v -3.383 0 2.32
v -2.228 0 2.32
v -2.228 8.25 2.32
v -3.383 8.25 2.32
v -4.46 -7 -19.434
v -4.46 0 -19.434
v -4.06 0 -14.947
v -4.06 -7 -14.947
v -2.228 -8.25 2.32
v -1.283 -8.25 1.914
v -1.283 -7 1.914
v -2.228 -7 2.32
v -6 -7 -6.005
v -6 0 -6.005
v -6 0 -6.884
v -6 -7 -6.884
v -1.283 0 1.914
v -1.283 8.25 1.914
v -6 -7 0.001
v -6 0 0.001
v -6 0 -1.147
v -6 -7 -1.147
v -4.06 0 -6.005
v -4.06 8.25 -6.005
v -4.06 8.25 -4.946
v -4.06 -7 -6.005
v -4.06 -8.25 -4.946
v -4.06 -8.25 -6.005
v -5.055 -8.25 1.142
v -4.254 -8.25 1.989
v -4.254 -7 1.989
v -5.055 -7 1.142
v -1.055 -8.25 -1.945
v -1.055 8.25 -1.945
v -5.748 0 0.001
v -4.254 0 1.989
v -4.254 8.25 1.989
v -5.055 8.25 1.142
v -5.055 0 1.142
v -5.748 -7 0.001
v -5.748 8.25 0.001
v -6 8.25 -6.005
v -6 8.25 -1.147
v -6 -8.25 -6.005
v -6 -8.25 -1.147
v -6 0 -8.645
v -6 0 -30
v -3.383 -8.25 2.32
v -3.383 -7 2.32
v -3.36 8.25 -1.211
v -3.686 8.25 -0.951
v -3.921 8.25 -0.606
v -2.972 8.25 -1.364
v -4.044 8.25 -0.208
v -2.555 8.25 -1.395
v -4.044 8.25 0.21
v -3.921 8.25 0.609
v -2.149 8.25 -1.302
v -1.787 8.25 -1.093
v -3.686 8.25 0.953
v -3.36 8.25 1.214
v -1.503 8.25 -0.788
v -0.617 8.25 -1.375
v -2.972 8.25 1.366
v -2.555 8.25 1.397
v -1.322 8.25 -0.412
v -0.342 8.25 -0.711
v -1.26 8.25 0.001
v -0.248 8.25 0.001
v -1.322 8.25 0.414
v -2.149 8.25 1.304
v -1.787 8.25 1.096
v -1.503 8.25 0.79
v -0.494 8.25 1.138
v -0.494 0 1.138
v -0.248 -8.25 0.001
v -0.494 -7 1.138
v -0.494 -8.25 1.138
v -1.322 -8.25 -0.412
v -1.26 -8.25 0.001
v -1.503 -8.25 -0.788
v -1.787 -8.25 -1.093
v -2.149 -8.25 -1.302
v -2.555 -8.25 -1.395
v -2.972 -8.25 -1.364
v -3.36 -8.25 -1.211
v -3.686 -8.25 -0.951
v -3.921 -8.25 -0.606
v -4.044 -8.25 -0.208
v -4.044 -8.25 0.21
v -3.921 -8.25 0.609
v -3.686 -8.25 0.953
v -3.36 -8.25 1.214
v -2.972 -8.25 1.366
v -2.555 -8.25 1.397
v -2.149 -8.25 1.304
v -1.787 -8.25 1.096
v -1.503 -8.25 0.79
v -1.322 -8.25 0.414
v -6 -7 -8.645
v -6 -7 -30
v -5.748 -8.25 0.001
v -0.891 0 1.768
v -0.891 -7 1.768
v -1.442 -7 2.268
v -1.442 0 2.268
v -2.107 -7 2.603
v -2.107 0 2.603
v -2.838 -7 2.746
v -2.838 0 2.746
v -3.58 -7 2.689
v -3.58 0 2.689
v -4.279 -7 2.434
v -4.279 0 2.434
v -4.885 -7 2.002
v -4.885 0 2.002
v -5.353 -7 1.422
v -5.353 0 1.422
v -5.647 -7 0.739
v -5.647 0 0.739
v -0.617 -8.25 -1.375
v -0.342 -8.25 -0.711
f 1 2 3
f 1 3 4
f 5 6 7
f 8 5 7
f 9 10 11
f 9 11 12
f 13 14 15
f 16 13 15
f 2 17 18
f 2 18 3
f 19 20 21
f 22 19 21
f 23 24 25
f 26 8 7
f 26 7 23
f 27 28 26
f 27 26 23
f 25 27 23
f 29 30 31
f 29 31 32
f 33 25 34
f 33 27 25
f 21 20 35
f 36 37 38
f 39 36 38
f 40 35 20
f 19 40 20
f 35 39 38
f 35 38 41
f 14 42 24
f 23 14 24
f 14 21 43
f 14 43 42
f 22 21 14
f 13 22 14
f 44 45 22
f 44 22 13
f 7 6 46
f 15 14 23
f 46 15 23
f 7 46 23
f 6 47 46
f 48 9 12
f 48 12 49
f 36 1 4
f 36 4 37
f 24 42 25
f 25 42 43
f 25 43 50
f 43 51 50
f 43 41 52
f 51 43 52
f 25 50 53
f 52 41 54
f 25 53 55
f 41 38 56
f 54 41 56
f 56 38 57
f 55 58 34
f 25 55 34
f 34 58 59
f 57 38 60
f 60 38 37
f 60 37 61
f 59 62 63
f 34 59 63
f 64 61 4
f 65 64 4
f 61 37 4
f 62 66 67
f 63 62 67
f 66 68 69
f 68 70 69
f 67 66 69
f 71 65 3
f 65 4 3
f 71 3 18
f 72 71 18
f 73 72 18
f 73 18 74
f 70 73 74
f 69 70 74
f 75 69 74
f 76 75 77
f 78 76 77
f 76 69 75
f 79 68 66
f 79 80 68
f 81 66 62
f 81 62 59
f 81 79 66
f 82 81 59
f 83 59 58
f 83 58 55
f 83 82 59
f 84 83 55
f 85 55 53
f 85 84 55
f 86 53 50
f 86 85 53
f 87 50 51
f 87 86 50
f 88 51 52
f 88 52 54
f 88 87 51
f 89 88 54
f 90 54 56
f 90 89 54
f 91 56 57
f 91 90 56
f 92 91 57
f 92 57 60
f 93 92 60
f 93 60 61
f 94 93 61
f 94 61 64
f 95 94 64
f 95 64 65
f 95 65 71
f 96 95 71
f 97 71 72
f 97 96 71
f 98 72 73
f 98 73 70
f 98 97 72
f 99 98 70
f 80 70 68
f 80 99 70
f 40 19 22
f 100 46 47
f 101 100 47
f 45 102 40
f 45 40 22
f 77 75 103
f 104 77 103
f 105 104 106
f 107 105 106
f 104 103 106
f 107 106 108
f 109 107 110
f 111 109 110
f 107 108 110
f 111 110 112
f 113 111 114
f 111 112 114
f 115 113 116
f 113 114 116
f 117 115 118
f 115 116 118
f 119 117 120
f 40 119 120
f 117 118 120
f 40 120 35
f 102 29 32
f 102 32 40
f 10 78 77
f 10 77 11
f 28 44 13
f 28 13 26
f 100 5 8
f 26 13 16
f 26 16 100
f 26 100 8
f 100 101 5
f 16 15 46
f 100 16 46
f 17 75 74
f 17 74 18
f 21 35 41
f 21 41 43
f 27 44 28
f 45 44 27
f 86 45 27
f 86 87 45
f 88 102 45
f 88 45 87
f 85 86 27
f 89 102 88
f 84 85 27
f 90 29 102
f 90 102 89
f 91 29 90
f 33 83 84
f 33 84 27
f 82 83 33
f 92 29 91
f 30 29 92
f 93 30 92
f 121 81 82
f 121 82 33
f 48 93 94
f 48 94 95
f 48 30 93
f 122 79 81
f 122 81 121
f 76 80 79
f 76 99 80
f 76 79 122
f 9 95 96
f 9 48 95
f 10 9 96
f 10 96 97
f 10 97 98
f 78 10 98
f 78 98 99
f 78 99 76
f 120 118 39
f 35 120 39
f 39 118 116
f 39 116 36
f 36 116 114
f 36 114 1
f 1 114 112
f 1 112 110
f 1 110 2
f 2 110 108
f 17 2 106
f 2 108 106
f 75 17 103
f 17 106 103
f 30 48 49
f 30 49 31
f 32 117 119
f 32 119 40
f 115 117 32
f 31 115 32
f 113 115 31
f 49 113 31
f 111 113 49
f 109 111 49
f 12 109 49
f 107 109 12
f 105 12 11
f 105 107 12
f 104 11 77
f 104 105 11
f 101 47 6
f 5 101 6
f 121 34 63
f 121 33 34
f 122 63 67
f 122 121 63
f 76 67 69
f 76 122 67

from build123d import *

# Parameters (mm, degrees)
F1_DEPTH = 8.25
F2_DEPTH = 7


# Not quite as in the source:
# - a feature names something its author has since deleted; it is built from what else it names


with BuildPart() as f1:
    # F0 (on Front) → F1 (new body, symmetric)
    with BuildSketch(Plane.XZ):
        with BuildLine():
            Line((-1.2599999983, 0.001106019), (-0.2481810163, 0.001106019))
            Line((-0.2481810241, 0.001106019), (-0.4941885147, 1.1379972147))
            Line((-0.4941885147, 1.1379972147), (-1.2832667135, 1.9140606746))
            Line((-1.2832667135, 1.9140606746), (-2.2277169394, 2.3196199825))
            Line((-2.2277169394, 2.3196199825), (-3.3833966788, 2.3196199825))
            Line((-3.3833966788, 2.3196199825), (-4.2535923825, 1.9888198258))
            Line((-4.2535923825, 1.9888198258), (-5.0546050044, 1.1417629963))
            Line((-5.0546050044, 1.1417629963), (-5.7481810085, 0.001106019))
            Line((-5.7481810085, 0.001106019), (-4.0599999983, 0.001106019))
            ThreePointArc((-4.0599999983, 0.001106019), (-2.6599999983, 1.401106019), (-1.2599999983, 0.001106019))
        make_face()
        with BuildLine():
            ThreePointArc((-1.0547499373, -1.9445495701), (-0.4578133732, -1.0519999951), (-0.2481810085, 0.001106019))
            Line((-0.2481810163, 0.001106019), (-1.2599999983, 0.001106019))
            ThreePointArc((-1.2599999983, 0.001106019), (-2.6599999983, -1.398893981), (-4.0599999983, 0.001106019))
            Line((-4.0599999983, 0.001106019), (-5.7481810085, 0.001106019))
            ThreePointArc((-5.7481810085, 0.001106019), (-4.0512870227, -2.5392616163), (-1.0547499373, -1.9445495701))
        make_face()
        with BuildLine():
            Line((-4.0599999966, -4.9463636499), (-1.0547499373, -1.9445495701))
            ThreePointArc((-1.0547499373, -1.9445495701), (-4.0512870227, -2.5392616163), (-5.7481810085, 0.001106019))
            Line((-5.7481810085, 0.001106019), (-5.9999999983, -1.1473703696))
            Line((-5.9999999983, -1.1473703696), (-5.9999999983, -4.8066070303))
            Line((-5.9999999983, -4.8066070303), (-5.9999999983, -6.0053556226))
            Line((-5.9999999983, -6.0053556226), (-5.1202041279, -6.0053556226))
            Line((-5.1202041279, -6.0053556226), (-4.0599999966, -4.9463636499))
        make_face()
        Polygon((-4.0599999966, -6.0053556226), (-4.0599999966, -4.9463636499), (-5.1202041279, -6.0053556226), align=None)
    extrude(amount=F1_DEPTH, both=True)

    # F0 (on Front) → F2 (join)
    with BuildSketch(Plane.XZ):
        with BuildLine():
            Line((-1.2832667135, 1.9140606746), (-0.4941885147, 1.1379972147))
            ThreePointArc((-0.4941885147, 1.1379972147), (-3.5797825225, 2.6889005943), (-5.7481810085, 0.001106019))
            Line((-5.7481810085, 0.001106019), (-5.0546050044, 1.1417629963))
            Line((-5.0546050044, 1.1417629963), (-4.2535923825, 1.9888198258))
            Line((-4.2535923825, 1.9888198258), (-3.3833966788, 2.3196199825))
            Line((-3.3833966788, 2.3196199825), (-2.2277169394, 2.3196199825))
            Line((-2.2277169394, 2.3196199825), (-1.2832667135, 1.9140606746))
        make_face()
        Polygon((-5.9999999983, -1.1473703696), (-5.7481810085, 0.001106019), (-6, 0.001106019), align=None)
        Polygon((-4.0599999966, -14.9466558945), (-4.0599999966, -8.645166643), (-5.9999999983, -8.645166643), (-5.9999999983, -30), (-4.4599999966, -19.4339305162), align=None)
        Polygon((-4.0599999966, -6.0053556226), (-5.1202041279, -6.0053556226), (-6, -6.8841456016), (-5.9999999983, -8.645166643), (-4.0599999966, -8.645166643), align=None)
        Polygon((-6, -6.8841456016), (-5.1202041279, -6.0053556226), (-5.9999999983, -6.0053556226), align=None)
    extrude(amount=F2_DEPTH)


solid = f1.part
